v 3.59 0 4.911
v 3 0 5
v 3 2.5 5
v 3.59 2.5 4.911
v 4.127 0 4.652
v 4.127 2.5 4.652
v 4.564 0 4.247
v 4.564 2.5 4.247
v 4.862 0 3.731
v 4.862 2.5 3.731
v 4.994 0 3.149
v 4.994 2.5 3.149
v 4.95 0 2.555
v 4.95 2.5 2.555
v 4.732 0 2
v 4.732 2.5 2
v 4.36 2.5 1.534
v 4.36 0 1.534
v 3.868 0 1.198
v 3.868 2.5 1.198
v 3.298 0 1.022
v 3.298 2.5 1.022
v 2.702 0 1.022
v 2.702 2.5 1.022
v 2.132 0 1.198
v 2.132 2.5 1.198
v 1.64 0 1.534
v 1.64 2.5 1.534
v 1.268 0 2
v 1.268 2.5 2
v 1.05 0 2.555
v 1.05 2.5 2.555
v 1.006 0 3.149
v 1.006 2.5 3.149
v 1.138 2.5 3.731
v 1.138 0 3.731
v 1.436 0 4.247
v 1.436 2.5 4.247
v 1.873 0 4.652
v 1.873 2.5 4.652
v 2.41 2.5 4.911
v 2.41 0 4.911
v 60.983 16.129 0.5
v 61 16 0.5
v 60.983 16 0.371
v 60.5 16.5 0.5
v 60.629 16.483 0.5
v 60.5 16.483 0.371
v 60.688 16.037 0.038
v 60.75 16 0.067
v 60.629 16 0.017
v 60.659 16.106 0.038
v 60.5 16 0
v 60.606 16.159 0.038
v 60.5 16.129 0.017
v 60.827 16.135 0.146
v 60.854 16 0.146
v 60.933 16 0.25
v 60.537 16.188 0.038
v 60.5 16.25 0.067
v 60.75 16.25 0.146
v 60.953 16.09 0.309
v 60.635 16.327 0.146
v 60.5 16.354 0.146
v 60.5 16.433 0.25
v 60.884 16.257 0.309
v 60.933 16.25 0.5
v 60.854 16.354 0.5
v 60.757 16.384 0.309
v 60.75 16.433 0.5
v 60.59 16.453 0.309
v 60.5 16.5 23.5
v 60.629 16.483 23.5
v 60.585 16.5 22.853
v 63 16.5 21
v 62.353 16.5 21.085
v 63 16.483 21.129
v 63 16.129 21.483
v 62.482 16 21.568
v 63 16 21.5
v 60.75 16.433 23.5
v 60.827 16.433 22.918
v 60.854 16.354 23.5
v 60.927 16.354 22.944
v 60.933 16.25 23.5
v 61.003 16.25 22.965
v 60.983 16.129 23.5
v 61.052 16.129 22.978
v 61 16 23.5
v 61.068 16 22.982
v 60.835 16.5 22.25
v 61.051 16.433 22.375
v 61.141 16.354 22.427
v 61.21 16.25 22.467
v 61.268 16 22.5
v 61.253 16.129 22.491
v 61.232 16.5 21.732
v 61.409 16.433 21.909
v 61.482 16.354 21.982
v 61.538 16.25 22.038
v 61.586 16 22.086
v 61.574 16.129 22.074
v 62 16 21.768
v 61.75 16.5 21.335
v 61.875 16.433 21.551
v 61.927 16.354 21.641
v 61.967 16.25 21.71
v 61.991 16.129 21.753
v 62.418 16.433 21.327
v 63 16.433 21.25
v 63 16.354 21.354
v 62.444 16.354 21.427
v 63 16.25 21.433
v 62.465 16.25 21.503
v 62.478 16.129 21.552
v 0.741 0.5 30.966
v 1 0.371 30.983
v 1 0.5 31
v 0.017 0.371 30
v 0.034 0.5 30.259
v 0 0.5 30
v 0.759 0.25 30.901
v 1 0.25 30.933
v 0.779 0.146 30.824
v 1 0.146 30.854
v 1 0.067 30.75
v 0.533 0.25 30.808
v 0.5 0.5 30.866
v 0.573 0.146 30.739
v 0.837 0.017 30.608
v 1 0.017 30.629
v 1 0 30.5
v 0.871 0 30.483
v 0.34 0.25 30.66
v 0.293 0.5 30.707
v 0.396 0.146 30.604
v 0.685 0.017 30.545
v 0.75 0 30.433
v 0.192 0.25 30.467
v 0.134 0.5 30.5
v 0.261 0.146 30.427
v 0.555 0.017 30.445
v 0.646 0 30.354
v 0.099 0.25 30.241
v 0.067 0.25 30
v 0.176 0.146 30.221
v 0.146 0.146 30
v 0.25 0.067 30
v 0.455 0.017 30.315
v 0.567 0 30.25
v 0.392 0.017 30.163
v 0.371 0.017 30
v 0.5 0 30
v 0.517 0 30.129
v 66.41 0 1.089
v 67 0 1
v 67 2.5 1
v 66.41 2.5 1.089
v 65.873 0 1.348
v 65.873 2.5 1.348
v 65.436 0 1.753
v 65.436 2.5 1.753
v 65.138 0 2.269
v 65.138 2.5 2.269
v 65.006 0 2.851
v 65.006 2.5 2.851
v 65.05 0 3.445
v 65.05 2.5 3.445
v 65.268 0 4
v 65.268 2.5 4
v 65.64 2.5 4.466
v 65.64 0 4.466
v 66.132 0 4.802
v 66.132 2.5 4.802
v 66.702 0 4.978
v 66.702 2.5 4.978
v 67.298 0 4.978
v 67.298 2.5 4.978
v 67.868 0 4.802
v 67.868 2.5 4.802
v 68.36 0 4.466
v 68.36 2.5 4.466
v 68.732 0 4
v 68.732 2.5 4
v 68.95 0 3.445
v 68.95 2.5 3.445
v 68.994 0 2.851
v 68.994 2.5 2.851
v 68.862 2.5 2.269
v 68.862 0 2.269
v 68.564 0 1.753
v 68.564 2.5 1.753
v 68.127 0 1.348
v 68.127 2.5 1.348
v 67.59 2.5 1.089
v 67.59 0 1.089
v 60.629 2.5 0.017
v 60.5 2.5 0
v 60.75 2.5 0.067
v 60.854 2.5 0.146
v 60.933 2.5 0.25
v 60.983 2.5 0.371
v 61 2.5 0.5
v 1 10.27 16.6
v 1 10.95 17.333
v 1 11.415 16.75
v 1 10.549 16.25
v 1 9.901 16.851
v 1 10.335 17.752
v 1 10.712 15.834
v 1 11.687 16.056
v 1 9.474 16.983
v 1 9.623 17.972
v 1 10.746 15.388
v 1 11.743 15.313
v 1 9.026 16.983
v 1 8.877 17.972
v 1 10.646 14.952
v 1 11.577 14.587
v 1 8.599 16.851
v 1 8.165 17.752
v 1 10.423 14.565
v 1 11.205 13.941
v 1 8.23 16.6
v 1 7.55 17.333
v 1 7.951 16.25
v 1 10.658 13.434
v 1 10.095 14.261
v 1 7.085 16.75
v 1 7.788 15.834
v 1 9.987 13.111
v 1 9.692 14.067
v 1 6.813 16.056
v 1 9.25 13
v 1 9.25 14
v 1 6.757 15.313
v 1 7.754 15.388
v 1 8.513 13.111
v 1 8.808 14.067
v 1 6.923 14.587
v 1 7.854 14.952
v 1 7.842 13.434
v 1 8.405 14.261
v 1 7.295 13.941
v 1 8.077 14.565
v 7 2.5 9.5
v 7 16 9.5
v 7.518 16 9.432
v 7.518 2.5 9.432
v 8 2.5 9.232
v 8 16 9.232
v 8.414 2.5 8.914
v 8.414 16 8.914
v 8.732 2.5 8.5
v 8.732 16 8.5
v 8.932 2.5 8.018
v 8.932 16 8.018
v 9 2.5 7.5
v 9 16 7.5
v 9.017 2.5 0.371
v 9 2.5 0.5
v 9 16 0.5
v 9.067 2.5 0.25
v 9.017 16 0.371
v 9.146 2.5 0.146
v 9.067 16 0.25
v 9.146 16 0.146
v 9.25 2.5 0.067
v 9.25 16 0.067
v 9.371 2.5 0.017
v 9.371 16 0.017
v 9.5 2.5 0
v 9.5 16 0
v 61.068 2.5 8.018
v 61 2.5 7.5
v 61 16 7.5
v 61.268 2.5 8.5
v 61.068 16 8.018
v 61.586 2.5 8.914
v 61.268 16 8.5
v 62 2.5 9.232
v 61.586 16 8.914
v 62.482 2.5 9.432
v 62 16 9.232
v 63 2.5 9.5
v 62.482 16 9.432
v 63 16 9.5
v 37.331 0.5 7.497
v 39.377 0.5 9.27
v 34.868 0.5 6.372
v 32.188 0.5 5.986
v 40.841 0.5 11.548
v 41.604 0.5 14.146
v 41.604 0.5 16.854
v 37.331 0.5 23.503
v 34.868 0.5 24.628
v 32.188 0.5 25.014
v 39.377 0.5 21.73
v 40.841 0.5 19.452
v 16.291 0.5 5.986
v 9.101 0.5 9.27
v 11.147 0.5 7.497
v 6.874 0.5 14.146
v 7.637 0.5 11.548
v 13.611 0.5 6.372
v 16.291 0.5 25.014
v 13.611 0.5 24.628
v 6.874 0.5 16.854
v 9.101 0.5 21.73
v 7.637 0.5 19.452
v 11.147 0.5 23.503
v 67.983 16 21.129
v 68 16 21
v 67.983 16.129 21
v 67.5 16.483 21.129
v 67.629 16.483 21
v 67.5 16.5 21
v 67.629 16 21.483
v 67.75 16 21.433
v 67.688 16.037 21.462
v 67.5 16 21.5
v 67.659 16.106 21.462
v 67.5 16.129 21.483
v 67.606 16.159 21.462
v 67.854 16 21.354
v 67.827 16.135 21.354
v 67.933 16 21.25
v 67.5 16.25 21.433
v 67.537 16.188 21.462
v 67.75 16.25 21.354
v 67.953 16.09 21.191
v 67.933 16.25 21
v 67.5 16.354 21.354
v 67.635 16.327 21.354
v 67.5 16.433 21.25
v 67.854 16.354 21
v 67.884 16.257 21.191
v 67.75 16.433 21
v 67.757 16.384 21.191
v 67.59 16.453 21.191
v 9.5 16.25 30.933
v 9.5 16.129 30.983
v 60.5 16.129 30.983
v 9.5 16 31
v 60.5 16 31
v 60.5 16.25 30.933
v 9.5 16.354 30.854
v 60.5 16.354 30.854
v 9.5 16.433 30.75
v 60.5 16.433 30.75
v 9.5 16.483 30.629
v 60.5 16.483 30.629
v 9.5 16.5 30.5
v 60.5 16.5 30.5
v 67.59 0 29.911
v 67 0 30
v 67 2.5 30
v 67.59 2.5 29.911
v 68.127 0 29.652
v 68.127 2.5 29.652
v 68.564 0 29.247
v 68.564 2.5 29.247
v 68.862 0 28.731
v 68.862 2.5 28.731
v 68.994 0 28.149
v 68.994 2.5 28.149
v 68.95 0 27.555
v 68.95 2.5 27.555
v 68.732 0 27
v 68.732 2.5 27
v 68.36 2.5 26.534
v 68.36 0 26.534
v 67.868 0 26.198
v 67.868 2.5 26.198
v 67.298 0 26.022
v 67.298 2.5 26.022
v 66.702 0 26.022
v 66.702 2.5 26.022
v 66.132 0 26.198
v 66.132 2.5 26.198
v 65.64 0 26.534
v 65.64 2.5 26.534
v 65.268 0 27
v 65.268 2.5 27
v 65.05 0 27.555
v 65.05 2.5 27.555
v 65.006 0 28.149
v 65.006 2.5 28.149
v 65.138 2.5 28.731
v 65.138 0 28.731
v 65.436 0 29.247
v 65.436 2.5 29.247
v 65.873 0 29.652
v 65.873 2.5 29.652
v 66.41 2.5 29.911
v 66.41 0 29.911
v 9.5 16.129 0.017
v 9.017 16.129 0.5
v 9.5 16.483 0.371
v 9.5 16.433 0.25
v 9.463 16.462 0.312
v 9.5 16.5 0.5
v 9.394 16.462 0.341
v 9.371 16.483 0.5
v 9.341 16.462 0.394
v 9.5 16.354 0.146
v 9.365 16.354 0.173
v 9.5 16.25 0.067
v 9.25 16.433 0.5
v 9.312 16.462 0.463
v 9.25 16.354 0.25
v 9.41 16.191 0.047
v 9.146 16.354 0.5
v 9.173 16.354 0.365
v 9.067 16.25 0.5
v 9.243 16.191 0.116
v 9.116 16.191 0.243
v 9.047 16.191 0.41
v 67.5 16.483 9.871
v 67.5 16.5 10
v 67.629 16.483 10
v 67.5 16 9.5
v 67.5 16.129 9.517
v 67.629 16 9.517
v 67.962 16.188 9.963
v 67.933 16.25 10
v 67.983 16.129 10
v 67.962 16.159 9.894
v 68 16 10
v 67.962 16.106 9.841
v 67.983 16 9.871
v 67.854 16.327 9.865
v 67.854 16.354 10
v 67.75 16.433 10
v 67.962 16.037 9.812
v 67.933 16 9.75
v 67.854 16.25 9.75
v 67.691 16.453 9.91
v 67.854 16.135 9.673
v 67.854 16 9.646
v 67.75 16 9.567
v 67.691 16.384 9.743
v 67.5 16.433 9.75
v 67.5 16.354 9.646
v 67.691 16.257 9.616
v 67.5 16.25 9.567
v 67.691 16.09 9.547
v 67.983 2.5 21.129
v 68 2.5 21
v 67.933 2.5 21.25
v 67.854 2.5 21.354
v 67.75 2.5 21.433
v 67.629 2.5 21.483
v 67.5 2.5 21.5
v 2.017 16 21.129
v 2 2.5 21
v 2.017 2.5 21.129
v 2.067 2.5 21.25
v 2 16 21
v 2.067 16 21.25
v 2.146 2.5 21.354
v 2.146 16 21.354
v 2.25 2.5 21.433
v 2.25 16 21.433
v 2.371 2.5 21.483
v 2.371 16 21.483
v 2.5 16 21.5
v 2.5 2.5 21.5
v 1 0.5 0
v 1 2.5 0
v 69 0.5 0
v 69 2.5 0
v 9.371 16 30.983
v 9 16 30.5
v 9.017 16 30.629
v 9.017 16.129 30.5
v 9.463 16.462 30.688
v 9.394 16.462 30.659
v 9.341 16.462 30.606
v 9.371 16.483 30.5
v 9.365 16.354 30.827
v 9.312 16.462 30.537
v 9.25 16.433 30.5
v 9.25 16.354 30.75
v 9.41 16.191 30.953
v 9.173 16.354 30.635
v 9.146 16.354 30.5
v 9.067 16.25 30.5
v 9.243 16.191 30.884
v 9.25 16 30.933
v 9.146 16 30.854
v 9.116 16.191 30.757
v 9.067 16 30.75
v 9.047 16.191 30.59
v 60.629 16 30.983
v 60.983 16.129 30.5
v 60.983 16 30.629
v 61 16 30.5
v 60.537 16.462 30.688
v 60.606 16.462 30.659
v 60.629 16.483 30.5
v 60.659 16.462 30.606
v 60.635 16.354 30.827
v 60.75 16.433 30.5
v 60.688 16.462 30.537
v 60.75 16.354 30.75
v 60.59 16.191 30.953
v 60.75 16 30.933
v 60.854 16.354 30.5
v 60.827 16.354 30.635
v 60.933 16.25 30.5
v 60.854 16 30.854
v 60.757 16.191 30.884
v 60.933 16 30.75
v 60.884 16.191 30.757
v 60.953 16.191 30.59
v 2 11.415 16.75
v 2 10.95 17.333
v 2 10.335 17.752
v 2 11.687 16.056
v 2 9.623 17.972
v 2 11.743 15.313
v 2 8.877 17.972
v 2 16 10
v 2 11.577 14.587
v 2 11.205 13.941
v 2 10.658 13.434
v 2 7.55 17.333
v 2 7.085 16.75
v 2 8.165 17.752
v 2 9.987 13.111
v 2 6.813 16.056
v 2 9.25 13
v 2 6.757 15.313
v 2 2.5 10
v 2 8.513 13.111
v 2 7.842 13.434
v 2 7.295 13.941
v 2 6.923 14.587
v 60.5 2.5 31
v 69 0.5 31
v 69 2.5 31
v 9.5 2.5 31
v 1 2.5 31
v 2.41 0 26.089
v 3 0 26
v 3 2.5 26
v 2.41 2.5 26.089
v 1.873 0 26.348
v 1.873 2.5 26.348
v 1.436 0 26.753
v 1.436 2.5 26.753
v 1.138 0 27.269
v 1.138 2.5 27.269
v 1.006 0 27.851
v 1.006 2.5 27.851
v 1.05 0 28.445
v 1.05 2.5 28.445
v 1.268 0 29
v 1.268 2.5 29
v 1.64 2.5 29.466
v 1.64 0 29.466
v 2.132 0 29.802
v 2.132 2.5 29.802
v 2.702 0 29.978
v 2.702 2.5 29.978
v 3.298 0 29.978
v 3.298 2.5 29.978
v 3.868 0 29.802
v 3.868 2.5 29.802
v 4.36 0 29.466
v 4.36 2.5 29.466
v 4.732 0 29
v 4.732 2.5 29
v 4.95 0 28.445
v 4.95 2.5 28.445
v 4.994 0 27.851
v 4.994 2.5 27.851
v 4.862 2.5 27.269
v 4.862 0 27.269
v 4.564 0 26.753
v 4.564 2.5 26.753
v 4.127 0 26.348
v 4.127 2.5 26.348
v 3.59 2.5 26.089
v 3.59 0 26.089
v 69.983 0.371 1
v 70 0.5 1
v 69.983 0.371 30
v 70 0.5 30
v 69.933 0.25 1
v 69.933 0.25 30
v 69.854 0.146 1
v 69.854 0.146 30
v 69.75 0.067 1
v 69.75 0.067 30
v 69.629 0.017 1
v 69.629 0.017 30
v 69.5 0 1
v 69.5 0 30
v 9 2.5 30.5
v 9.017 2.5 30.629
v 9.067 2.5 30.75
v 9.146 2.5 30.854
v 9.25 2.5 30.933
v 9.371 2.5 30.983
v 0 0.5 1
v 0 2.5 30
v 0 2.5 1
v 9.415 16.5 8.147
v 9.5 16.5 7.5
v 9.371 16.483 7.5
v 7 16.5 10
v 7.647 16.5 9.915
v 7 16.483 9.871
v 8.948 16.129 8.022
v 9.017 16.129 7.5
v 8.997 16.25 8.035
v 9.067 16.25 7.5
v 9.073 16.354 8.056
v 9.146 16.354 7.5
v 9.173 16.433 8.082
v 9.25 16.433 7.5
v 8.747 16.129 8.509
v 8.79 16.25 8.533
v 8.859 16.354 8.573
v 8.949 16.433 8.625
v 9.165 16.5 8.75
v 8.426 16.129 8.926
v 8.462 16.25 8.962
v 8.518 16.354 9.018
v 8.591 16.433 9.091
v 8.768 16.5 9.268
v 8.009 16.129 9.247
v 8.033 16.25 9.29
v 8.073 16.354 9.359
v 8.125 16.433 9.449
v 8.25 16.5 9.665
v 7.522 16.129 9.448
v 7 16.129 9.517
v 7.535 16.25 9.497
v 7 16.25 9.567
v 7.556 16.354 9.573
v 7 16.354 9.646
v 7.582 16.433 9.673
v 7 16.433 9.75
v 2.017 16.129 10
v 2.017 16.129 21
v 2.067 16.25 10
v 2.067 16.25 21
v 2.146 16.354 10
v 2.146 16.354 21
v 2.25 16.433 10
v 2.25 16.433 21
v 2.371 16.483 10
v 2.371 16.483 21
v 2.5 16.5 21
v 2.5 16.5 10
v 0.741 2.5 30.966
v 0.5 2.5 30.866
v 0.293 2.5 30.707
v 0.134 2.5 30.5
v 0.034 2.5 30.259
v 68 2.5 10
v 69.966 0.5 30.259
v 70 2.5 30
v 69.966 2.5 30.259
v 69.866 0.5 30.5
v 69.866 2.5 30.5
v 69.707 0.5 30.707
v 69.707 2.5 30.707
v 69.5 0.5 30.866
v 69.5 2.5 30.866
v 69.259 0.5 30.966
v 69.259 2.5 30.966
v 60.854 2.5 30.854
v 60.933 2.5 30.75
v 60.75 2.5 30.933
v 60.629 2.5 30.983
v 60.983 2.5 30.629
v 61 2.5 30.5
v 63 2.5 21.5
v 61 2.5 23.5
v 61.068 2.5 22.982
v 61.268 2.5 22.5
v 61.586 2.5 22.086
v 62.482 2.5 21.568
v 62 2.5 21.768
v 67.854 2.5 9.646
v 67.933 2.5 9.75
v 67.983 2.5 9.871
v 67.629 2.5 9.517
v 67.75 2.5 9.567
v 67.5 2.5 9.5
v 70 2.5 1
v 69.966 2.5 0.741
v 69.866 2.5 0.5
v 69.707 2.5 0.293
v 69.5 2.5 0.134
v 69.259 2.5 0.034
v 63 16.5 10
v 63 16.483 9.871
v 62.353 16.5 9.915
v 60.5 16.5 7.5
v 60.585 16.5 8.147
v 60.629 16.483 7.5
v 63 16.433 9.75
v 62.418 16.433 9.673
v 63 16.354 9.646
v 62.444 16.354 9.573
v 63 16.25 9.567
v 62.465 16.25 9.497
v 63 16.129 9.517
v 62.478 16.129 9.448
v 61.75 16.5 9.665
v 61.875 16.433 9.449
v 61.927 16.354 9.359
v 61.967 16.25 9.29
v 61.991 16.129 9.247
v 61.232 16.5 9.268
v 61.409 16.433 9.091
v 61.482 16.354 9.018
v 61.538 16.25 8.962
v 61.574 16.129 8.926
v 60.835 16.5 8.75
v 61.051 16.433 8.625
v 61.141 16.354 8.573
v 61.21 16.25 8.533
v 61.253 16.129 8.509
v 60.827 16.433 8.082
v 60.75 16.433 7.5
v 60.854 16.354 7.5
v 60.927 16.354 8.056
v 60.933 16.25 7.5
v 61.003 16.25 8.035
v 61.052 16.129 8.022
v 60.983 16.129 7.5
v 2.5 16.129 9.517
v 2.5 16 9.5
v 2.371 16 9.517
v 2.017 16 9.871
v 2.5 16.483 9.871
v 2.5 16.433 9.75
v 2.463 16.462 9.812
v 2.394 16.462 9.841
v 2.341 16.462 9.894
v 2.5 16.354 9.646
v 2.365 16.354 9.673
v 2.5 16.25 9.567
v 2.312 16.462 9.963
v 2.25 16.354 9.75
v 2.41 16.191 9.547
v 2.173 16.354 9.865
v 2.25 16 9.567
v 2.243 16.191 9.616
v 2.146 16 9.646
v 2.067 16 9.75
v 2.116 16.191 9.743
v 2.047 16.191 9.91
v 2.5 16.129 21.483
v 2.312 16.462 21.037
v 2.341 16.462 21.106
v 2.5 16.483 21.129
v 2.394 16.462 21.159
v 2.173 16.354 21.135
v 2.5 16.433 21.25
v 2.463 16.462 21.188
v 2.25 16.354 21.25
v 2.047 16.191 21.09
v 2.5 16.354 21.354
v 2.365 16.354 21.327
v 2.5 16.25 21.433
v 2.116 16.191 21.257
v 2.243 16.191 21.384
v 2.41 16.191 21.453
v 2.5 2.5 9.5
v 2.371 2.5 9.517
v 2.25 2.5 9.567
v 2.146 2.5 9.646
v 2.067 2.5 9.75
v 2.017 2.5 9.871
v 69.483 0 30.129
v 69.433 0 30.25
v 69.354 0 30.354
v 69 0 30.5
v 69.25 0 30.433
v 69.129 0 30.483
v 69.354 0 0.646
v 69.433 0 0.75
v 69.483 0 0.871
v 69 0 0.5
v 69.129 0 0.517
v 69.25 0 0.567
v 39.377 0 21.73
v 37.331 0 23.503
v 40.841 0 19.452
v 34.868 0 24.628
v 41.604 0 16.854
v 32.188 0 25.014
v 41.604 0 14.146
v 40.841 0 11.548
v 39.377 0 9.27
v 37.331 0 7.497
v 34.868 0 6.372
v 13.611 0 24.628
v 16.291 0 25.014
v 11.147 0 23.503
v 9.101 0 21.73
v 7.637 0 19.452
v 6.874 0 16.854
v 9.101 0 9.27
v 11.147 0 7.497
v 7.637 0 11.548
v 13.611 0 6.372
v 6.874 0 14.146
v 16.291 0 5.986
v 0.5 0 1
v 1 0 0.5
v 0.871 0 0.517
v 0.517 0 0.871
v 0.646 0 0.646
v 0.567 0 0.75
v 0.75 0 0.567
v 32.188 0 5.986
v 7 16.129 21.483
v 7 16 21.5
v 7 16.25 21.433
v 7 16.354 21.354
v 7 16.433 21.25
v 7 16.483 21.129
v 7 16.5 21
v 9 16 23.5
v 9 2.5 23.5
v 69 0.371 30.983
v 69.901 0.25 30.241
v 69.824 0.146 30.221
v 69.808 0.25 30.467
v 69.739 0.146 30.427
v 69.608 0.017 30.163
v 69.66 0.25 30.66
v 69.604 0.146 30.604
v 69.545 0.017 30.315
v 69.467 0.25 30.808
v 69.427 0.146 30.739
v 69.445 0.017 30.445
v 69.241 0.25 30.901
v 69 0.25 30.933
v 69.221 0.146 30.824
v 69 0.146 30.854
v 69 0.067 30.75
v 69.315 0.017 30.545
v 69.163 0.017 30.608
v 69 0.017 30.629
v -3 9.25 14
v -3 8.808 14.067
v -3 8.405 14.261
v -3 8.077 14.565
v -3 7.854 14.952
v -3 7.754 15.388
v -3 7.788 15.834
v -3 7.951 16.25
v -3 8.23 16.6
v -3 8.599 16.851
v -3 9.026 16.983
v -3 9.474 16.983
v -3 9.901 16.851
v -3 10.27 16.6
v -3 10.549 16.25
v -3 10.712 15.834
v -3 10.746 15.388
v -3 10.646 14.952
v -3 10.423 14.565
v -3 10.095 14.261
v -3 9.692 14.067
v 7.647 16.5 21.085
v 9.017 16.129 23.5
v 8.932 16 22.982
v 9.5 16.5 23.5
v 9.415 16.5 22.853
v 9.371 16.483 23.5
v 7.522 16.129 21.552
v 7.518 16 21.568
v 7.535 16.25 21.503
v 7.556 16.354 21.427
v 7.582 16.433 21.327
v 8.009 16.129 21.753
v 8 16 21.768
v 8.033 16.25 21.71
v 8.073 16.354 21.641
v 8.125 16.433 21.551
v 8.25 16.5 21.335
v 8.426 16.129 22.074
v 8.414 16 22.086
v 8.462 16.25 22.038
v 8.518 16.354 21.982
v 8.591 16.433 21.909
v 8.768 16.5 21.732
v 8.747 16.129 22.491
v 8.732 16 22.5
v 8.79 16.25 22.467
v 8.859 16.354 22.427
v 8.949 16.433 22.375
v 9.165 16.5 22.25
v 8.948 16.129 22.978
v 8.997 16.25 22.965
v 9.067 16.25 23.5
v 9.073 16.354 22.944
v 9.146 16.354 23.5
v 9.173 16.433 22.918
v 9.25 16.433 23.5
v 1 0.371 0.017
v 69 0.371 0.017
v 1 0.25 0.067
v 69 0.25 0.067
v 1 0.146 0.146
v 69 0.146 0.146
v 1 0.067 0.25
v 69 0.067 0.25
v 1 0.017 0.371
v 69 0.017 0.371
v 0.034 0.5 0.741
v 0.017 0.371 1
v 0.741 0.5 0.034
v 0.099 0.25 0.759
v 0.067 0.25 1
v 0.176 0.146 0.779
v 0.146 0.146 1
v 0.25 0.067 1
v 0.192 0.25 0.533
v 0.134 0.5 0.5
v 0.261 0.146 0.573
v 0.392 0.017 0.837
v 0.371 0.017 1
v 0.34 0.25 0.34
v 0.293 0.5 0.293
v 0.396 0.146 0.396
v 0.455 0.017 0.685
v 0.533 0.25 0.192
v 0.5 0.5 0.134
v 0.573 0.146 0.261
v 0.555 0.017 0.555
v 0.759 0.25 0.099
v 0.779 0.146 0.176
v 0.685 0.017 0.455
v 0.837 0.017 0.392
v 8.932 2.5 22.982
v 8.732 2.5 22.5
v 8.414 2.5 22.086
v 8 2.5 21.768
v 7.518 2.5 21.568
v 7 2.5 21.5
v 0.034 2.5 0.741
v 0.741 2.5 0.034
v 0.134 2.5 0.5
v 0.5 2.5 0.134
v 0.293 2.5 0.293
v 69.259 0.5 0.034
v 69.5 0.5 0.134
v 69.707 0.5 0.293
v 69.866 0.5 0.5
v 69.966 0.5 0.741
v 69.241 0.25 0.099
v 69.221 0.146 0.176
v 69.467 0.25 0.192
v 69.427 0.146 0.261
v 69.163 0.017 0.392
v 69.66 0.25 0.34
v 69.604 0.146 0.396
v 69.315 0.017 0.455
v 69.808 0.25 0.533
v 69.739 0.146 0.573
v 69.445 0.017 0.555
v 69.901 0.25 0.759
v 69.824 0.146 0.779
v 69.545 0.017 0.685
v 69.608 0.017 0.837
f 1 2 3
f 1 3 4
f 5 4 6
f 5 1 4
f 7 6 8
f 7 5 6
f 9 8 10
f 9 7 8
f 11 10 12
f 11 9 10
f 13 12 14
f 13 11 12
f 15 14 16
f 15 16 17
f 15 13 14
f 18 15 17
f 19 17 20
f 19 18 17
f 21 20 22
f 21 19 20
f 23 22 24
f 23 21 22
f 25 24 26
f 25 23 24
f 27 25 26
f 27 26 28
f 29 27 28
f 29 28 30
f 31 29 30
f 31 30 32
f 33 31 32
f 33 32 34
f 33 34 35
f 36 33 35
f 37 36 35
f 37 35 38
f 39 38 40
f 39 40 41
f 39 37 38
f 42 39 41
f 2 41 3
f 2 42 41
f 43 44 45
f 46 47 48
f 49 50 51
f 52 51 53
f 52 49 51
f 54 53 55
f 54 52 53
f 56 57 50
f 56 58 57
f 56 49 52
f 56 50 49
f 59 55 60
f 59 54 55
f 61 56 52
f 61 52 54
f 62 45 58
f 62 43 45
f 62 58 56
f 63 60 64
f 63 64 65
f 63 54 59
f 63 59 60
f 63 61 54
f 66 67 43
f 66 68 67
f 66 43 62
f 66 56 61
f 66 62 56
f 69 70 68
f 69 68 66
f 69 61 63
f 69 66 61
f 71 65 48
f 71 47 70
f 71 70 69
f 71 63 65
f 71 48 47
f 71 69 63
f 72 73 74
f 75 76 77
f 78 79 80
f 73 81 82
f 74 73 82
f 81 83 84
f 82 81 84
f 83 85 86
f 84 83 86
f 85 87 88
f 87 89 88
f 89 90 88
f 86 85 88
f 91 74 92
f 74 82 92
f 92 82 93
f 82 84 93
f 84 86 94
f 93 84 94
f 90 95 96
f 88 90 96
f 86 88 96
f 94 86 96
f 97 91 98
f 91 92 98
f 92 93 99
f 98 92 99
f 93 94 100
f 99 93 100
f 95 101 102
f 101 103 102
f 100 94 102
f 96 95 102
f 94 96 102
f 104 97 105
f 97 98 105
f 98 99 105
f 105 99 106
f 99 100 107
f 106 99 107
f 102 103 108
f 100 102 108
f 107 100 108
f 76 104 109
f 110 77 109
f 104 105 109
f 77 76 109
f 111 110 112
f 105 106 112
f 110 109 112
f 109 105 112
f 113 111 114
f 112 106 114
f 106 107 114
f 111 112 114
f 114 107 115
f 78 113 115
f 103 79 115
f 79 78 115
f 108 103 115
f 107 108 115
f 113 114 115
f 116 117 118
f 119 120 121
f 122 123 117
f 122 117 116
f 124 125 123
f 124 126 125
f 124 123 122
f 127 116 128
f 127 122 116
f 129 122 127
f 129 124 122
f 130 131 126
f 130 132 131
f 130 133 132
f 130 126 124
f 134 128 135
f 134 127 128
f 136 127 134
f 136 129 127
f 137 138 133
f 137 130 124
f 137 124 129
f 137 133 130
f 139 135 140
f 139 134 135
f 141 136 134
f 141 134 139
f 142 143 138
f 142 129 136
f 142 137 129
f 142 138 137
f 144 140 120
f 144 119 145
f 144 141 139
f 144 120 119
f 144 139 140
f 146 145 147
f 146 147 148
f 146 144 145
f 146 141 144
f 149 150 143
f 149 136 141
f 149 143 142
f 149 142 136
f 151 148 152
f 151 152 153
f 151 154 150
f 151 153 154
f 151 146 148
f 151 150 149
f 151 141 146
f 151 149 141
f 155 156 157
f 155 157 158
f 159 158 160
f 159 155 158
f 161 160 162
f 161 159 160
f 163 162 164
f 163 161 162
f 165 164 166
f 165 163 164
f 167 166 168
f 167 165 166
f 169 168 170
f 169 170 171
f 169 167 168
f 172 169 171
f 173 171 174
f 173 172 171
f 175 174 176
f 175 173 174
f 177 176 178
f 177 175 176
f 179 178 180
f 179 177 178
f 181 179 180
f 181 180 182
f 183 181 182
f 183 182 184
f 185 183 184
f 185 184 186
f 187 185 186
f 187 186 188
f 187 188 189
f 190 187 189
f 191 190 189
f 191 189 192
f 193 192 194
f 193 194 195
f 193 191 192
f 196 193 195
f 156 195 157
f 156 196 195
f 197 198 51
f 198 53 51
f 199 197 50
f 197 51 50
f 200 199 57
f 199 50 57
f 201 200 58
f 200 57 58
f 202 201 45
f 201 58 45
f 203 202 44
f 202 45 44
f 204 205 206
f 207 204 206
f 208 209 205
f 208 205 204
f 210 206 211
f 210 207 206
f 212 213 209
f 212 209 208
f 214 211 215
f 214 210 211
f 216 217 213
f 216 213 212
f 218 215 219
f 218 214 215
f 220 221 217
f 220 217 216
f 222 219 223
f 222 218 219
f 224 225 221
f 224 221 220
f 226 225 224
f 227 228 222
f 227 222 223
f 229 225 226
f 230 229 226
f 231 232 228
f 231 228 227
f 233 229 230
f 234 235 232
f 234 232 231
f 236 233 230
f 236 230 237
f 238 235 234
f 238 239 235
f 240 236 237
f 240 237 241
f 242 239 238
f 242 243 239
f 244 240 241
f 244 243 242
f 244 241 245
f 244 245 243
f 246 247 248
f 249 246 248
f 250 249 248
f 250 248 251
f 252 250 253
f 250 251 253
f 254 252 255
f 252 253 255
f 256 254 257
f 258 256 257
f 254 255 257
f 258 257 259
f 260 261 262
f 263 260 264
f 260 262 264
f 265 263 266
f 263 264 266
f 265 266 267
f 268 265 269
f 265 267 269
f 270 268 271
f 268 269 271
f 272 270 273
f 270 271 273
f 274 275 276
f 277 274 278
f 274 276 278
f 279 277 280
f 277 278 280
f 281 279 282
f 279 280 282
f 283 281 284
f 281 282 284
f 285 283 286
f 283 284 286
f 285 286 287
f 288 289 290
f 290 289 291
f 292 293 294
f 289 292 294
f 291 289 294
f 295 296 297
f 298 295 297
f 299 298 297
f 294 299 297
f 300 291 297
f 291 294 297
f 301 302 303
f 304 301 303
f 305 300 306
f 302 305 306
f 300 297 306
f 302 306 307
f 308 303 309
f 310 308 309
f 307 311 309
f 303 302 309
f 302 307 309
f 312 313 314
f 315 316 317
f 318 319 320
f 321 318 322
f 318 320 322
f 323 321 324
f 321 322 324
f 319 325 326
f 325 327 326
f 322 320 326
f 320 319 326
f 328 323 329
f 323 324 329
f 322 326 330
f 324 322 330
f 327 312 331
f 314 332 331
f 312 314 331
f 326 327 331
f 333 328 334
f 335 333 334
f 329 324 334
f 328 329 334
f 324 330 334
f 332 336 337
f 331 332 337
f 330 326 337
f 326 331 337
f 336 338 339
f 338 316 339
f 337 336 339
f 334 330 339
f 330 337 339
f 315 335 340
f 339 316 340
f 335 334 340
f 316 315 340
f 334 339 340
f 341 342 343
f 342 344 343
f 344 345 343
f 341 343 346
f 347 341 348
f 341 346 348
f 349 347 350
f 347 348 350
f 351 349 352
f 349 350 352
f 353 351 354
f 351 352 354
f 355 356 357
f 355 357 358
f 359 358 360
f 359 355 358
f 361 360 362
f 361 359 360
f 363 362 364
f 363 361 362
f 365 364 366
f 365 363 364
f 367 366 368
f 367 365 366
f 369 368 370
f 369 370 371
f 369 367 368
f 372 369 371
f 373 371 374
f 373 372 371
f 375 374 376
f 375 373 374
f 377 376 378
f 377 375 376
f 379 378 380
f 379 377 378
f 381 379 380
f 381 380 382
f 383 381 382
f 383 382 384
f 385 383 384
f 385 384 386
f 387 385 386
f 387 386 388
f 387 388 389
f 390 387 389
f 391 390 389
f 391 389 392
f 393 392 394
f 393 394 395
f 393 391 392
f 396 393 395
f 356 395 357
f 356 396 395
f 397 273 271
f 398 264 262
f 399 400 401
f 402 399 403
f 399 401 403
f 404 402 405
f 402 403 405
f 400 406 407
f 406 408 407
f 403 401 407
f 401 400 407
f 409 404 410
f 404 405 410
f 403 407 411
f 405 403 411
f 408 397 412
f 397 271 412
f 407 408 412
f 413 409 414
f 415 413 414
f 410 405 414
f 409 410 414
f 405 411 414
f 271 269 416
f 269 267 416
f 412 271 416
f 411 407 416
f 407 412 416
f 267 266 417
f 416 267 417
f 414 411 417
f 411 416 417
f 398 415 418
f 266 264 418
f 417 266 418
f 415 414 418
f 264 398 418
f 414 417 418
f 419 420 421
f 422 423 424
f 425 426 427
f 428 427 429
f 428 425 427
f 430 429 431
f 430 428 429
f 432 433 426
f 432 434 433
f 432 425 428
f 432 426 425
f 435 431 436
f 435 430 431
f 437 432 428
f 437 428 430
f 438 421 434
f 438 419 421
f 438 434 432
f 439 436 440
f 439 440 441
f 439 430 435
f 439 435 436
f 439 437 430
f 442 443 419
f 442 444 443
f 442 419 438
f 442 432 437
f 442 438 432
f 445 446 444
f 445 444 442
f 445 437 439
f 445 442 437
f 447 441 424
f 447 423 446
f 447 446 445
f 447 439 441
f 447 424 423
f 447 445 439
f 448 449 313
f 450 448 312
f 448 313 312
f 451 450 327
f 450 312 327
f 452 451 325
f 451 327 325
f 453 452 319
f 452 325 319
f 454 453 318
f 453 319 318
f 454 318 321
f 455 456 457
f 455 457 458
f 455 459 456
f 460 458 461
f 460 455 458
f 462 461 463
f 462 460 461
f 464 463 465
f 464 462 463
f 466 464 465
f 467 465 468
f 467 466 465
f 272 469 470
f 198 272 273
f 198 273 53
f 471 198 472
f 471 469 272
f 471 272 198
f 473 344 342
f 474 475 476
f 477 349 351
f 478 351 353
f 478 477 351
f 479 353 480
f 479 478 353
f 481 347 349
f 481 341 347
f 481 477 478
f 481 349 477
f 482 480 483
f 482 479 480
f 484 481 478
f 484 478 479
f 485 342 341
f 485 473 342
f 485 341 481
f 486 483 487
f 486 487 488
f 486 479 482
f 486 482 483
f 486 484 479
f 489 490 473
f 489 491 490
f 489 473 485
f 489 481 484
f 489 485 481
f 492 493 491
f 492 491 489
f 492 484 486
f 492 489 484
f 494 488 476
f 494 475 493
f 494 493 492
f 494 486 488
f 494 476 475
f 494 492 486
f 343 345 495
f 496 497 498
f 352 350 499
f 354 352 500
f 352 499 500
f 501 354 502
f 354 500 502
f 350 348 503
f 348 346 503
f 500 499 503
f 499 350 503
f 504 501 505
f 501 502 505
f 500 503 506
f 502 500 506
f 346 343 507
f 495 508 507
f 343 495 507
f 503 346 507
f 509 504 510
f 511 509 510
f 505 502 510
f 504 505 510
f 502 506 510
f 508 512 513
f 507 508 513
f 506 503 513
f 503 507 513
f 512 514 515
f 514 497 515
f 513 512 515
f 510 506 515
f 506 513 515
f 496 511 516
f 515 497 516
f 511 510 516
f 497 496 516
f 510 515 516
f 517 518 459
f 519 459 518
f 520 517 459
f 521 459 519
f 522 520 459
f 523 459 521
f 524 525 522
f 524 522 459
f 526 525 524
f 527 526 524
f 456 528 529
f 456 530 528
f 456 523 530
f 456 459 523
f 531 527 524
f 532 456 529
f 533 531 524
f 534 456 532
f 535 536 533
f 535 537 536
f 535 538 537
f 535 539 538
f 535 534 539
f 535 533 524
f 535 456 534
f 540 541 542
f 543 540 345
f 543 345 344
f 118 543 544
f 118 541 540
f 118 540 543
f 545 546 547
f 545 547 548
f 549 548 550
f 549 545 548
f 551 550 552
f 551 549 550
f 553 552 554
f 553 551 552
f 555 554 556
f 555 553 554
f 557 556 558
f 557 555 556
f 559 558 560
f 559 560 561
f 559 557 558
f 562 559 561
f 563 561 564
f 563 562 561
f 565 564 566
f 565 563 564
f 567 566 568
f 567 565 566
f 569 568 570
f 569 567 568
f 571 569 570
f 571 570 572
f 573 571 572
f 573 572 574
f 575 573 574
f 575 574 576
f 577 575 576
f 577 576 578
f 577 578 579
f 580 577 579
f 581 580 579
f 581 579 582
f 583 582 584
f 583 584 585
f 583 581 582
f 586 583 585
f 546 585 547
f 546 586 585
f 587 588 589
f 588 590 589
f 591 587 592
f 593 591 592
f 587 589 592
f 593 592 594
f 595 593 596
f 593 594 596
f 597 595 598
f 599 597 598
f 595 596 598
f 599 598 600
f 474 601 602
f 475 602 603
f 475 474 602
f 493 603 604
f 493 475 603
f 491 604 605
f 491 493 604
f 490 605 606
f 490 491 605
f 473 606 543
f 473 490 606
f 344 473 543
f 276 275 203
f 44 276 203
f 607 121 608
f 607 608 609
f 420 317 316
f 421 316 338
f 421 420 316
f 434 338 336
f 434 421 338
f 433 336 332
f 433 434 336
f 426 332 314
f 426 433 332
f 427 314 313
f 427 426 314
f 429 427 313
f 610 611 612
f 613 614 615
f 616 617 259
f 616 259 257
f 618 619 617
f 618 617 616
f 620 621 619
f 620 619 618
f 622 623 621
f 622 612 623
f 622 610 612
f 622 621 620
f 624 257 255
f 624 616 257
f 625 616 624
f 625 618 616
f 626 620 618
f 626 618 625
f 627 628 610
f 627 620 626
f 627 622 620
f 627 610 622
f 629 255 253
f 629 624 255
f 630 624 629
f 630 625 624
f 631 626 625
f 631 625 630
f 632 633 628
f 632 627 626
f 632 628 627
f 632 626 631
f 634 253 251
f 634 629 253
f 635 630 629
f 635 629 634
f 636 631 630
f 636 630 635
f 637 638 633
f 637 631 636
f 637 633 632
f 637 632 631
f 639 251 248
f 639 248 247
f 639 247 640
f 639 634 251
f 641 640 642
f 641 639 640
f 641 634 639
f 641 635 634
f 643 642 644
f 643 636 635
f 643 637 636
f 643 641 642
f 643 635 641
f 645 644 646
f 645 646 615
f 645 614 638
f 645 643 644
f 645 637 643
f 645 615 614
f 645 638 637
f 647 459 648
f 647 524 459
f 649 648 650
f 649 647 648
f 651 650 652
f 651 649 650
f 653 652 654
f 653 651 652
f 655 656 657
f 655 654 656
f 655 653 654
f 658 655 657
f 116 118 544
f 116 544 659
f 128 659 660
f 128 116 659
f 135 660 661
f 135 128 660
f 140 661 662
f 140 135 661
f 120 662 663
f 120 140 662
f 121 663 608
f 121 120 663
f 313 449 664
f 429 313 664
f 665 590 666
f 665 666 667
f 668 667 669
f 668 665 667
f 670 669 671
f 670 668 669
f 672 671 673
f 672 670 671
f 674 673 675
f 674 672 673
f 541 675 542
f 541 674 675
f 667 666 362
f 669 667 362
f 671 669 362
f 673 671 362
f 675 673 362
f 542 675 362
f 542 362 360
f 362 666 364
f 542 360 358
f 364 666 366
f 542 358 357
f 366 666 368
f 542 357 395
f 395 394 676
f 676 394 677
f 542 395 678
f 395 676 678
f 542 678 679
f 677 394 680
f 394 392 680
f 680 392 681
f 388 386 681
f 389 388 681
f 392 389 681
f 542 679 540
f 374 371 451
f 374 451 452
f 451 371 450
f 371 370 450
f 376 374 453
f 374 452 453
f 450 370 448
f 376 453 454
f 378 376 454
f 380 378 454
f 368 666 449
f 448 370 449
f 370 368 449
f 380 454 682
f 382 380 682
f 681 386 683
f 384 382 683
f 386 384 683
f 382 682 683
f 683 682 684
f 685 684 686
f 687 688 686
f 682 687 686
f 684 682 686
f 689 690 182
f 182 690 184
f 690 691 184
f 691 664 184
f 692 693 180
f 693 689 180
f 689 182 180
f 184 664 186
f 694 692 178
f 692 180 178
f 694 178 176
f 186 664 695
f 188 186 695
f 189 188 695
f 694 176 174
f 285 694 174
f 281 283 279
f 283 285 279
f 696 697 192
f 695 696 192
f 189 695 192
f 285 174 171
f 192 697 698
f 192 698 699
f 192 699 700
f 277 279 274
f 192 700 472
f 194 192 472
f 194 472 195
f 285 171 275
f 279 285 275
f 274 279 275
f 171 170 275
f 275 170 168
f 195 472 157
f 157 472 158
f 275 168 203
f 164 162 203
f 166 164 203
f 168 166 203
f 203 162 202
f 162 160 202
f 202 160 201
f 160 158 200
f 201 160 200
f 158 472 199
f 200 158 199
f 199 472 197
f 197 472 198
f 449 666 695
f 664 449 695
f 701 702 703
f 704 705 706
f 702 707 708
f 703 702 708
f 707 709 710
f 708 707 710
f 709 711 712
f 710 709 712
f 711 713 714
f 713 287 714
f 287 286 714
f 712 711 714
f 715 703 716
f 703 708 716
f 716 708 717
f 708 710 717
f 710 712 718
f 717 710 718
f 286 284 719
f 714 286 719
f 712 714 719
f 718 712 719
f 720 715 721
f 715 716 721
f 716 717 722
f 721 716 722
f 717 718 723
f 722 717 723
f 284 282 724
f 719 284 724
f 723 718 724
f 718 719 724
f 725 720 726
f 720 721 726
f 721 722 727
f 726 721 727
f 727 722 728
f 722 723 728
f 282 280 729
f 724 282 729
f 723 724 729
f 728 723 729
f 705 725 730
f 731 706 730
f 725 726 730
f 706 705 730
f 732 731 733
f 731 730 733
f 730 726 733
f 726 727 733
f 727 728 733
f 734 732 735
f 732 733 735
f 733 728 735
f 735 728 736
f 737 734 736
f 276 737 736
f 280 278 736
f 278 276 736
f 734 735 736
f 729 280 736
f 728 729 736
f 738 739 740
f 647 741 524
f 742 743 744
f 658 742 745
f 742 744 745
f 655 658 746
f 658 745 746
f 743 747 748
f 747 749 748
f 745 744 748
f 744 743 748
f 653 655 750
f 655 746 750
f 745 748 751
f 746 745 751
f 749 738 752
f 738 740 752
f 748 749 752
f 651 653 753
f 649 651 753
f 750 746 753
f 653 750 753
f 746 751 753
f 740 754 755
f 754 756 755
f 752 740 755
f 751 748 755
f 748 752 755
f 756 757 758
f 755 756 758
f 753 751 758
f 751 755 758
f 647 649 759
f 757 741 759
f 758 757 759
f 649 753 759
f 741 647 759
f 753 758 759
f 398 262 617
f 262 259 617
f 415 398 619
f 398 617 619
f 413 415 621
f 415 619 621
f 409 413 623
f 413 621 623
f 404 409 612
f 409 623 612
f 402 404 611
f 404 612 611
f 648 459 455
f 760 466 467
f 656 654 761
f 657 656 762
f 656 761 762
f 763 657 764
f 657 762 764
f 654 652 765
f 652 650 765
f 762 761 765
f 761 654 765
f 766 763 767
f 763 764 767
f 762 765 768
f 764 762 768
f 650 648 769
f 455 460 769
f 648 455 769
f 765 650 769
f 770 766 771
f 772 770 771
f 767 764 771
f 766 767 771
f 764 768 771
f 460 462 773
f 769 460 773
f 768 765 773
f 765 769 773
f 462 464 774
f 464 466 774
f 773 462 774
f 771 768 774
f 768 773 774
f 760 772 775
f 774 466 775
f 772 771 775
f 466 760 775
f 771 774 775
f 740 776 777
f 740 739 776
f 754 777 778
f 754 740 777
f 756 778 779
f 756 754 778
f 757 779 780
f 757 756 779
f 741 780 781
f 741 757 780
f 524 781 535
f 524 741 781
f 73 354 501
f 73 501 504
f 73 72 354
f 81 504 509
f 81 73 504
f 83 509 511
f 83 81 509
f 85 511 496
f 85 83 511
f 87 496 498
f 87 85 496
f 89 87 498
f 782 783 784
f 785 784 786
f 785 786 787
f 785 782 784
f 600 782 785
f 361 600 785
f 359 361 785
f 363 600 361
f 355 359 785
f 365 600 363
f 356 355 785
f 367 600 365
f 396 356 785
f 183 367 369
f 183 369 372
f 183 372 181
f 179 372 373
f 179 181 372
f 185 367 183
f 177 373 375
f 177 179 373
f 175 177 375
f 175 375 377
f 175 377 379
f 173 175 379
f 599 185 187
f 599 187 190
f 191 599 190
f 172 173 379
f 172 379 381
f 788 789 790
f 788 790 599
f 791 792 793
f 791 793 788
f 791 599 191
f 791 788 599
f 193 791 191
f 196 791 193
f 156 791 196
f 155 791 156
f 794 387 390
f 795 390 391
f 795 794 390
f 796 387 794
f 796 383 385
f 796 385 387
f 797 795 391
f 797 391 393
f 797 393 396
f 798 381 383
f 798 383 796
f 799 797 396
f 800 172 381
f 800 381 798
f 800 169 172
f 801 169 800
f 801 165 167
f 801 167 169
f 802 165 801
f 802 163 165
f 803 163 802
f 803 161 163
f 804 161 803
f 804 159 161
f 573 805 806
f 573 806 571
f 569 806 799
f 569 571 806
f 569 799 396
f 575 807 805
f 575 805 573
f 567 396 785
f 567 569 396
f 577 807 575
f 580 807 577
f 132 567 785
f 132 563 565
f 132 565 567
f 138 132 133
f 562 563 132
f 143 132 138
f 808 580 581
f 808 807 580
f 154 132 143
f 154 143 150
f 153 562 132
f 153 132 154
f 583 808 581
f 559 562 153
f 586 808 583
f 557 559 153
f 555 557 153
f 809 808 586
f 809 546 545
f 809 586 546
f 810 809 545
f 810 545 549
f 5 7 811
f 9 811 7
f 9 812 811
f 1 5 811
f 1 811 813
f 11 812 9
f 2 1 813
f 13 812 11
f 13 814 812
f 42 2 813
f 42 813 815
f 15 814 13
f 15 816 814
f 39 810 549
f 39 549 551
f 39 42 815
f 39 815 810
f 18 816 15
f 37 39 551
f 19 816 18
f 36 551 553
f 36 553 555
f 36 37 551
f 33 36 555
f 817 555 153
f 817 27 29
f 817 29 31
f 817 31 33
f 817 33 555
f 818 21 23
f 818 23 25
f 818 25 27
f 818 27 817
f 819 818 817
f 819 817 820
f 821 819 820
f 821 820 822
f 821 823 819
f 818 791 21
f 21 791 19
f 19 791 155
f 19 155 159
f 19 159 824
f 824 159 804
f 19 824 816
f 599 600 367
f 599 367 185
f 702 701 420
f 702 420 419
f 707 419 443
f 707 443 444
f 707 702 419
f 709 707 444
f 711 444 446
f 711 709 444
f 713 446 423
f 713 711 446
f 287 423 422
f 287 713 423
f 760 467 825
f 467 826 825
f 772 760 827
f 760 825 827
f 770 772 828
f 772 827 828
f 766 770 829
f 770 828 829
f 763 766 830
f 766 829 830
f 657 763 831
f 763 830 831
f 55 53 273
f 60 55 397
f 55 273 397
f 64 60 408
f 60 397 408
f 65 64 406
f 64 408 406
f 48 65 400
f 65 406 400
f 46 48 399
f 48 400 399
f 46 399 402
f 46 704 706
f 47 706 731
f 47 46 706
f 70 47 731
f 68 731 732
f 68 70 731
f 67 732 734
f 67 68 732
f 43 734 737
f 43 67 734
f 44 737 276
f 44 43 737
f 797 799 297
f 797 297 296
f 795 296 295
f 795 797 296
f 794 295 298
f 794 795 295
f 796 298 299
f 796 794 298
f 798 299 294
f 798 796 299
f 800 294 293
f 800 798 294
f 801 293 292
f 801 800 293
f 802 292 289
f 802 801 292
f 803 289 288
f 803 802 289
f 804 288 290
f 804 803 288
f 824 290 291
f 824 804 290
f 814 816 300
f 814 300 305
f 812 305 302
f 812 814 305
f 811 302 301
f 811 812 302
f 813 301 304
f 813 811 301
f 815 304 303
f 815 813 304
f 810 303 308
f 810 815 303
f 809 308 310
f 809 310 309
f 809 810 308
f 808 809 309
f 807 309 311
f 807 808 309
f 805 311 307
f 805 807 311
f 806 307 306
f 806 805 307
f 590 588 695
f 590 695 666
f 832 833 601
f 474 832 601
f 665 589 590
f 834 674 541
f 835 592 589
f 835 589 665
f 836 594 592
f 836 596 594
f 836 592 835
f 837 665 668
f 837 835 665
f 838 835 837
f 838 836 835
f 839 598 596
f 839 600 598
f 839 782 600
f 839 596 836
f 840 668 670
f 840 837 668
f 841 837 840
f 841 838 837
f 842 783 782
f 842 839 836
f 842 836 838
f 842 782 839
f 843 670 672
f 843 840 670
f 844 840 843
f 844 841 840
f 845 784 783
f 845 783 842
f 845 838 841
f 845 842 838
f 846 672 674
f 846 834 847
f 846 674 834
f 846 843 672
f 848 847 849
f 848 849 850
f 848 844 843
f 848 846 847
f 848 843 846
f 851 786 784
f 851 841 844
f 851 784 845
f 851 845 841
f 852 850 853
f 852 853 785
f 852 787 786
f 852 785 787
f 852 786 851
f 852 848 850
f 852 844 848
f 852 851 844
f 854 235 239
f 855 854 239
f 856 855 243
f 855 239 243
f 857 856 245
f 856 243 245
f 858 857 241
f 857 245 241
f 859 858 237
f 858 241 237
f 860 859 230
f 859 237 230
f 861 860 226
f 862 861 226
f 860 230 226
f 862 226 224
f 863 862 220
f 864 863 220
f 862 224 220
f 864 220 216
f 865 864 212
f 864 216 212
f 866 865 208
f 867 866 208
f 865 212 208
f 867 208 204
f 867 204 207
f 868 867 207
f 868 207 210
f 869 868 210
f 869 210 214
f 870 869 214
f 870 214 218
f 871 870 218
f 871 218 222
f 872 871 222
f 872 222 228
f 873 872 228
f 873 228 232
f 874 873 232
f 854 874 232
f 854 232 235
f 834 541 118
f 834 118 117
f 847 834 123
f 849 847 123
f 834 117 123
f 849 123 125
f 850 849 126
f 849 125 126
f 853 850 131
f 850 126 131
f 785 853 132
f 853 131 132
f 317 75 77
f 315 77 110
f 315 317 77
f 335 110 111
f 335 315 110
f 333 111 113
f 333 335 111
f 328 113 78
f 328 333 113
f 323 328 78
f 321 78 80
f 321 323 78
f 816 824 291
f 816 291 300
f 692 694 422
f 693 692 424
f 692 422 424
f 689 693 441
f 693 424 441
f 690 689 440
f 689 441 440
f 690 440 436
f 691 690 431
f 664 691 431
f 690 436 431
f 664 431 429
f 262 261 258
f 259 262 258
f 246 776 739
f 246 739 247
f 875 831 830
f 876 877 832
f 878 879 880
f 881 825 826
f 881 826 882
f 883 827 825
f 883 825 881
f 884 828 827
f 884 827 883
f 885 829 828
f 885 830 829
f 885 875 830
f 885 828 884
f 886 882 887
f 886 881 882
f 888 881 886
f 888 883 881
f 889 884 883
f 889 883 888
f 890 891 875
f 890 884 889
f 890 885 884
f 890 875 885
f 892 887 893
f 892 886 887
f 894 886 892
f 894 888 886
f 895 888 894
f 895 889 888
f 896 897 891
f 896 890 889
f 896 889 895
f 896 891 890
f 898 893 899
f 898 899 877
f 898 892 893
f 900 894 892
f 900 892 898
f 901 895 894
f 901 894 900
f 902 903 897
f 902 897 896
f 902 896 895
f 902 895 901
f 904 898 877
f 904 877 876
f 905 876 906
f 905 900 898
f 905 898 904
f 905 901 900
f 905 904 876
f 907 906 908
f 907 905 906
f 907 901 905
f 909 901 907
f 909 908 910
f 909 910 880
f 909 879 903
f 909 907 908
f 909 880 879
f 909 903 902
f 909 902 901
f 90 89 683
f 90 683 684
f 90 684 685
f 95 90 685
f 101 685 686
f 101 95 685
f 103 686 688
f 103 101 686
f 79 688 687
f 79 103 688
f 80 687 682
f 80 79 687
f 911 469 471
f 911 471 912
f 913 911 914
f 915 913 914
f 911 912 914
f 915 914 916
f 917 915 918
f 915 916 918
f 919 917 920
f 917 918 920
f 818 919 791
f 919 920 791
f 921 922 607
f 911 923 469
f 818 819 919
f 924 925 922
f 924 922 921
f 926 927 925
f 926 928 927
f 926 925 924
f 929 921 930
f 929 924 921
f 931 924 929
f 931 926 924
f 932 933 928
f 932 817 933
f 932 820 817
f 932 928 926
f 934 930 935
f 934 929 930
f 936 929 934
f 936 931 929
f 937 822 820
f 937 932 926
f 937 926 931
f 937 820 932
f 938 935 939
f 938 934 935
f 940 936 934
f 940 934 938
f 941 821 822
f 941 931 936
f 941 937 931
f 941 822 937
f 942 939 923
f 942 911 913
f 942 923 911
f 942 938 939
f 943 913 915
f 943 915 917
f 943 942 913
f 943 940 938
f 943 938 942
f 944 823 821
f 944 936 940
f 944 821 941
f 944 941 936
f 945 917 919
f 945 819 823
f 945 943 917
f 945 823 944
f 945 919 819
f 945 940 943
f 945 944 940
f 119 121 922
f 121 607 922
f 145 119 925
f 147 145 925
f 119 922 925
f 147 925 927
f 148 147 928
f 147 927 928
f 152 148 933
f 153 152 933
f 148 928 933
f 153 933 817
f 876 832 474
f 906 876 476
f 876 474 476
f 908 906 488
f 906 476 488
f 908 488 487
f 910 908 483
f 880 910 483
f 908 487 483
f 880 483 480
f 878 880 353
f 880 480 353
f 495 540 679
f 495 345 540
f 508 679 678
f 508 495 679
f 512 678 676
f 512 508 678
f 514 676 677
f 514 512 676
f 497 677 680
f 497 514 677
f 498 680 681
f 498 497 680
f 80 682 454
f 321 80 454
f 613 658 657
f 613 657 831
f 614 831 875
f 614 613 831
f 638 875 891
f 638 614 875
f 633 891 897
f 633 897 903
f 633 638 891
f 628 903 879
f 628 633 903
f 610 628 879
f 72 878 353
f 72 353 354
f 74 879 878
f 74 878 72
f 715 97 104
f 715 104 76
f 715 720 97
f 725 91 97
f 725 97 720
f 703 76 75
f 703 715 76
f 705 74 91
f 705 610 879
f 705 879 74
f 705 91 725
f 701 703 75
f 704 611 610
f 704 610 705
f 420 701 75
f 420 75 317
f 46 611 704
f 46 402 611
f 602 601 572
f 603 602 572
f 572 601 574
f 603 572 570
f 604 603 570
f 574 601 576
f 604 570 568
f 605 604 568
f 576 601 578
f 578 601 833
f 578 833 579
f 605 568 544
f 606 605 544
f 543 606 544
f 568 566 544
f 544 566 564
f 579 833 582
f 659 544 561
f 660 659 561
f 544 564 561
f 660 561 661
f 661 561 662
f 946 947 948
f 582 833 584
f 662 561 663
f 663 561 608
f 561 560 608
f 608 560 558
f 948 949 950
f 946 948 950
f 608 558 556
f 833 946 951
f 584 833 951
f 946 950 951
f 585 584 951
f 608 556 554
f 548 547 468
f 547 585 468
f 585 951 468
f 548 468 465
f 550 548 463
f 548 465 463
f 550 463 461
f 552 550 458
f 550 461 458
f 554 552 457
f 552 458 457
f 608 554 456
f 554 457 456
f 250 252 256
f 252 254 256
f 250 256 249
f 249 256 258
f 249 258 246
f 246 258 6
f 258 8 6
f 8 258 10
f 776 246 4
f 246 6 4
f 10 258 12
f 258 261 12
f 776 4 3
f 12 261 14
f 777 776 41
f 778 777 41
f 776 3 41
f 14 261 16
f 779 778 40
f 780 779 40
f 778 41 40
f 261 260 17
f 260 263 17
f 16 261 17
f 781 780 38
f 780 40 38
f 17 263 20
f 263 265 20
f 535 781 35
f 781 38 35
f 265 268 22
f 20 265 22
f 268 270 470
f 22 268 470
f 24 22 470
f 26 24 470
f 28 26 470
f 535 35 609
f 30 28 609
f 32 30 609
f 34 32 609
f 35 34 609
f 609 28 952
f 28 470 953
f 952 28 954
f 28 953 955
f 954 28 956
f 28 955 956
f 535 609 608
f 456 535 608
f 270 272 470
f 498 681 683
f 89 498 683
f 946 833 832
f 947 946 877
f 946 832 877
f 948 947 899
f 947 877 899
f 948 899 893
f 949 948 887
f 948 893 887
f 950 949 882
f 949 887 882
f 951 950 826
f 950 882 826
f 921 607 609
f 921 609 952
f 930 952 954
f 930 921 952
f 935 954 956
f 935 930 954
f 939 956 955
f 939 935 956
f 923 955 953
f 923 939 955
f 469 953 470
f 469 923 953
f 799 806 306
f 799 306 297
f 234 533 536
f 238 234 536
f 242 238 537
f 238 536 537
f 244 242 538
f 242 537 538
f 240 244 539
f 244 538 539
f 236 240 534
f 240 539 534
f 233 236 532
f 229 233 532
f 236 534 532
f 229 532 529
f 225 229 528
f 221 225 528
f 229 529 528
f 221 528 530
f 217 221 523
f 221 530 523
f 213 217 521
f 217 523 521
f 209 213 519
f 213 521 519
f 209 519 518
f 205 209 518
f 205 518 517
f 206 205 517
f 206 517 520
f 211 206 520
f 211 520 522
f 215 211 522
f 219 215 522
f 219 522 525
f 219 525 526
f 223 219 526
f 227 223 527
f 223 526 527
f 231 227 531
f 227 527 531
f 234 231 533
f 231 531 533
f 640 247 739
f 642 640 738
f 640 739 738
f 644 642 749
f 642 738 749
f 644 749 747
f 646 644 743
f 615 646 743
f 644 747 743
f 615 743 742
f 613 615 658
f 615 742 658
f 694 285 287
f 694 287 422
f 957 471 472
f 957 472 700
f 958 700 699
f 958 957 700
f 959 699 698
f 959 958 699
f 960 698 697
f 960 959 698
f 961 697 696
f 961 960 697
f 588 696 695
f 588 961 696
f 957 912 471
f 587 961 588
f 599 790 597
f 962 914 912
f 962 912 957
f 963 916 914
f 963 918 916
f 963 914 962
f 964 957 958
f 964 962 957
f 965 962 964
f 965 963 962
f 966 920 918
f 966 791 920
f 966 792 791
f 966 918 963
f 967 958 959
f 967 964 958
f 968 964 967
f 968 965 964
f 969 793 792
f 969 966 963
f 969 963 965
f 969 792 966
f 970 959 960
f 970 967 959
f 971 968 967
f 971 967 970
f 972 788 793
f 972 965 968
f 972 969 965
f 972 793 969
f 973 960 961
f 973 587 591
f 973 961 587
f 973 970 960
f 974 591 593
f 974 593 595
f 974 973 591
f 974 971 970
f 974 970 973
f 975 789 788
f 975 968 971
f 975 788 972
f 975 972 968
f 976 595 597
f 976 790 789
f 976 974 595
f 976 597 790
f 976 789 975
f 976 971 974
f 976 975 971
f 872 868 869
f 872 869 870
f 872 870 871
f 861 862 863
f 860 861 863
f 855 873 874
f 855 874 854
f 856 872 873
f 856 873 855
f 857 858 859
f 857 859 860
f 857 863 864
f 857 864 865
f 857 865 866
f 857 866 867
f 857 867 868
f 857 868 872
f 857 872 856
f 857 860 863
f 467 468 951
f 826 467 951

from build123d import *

# Parameters (mm, degrees)
SKETCH_1_R          = 2
EXTRUDE_1_DEPTH     = 2.5
SKETCH_2_W          = 7
SKETCH_2_H          = 12
EXTRUDE_2_DEPTH     = 14
FILLET_1_R          = 2
FILLET_2_R          = 2
FILLET_3_R          = 0.5
CUT_EXTRUDE_1_DEPTH = 0.5
SKETCH_4_R          = 1.5
EXTRUDE_3_DEPTH     = 5
SKETCH_5_R          = 2.5
EXTRUDE_4_DEPTH     = 1


with BuildPart() as part:
    # 草图1 → 凸台-拉伸1 (new body)
    with BuildSketch(Plane(origin=(0, 0, 0), x_dir=(1, 0, 0), z_dir=(0, 1, 0))):
        with BuildLine():
            Line((1, 0), (69, 0))
            ThreePointArc((69, 0), (69.707106781, -0.292893219), (70, -1))
            Line((70, -1), (70, -30))
            ThreePointArc((70, -30), (69.707106781, -30.707106781), (69, -31))
            Line((69, -31), (1, -31))
            ThreePointArc((1, -31), (0.292893219, -30.707106781), (0, -30))
            Line((0, -30), (0, -1))
            ThreePointArc((0, -1), (0.292893219, -0.292893219), (1, 0))
        make_face()
        with Locations(Location((3, -3, 0), (0, 0, 270))):
            Circle(SKETCH_1_R, mode=Mode.SUBTRACT)
        with Locations(Location((67, -3, 0), (0, 0, 90))):
            Circle(SKETCH_1_R, mode=Mode.SUBTRACT)
        with Locations(Location((67, -28, 0), (0, 0, 270))):
            Circle(SKETCH_1_R, mode=Mode.SUBTRACT)
        with Locations(Location((3, -28, 0), (0, 0, 90))):
            Circle(SKETCH_1_R, mode=Mode.SUBTRACT)
    extrude(amount=EXTRUDE_1_DEPTH)

    # 草图2 → 凸台-拉伸2 (add)
    with BuildSketch(Plane(origin=(0, 2.5, 0), x_dir=(1, 0, 0), z_dir=(0, 1, 0))):
        Polygon((61, 0), (9, 0), (9, -9.5), (9, -21.5), (9, -31), (61, -31), (61, -21.5), (61, -9.5), align=None)
        with Locations((5.5, -15.5)):
            Rectangle(SKETCH_2_W, SKETCH_2_H)
        with Locations((64.5, -15.5)):
            Rectangle(SKETCH_2_W, SKETCH_2_H)
    extrude(amount=EXTRUDE_2_DEPTH)

    # 圆角1
    fillet_1_edges = [part.edges().sort_by_distance(p)[0] for p in [
        (9, 9.5, 21.5),
    ]]
    fillet(fillet_1_edges, radius=FILLET_1_R)

    # 圆角2
    fillet_2_edges = [part.edges().sort_by_distance(p)[0] for p in [
        (61, 9.5, 9.5),
        (9, 9.5, 9.5),
        (61, 9.5, 21.5),
    ]]
    fillet(fillet_2_edges, radius=FILLET_2_R)

    # 圆角3
    fillet_3_edges = [part.edges().sort_by_distance(p)[0] for p in [
        (0, 0, 15.5),
        (0.292893219, 0, 0.292893219),
        (35, 0, 0),
        (69.707106781, 0, 0.292893219),
        (61, 16.5, 3.75),
        (61, 9.5, 0),
        (9, 9.5, 0),
        (2, 9.5, 9.5),
        (2, 9.5, 21.5),
        (9, 9.5, 31),
        (61, 9.5, 31),
        (68, 16.5, 15.5),
        (68, 9.5, 21.5),
        (68, 9.5, 9.5),
        (35, 16.5, 0),
        (9, 16.5, 3.75),
        (2, 16.5, 15.5),
        (35, 16.5, 31),
        (9, 16.5, 27.25),
        (4.5, 16.5, 21.5),
        (8.414213562, 16.5, 22.085786438),
        (70, 0, 15.5),
        (65.5, 16.5, 21.5),
        (69.707106781, 0, 30.707106781),
        (61, 16.5, 27.25),
        (65.5, 16.5, 9.5),
        (35, 0, 31),
        (4.5, 16.5, 9.5),
        (61.585786438, 16.5, 22.085786438),
        (0.292893219, 0, 30.707106781),
        (61.585786438, 16.5, 8.914213562),
        (8.414213562, 16.5, 8.914213562),
    ]]
    fillet(fillet_3_edges, radius=FILLET_3_R)

    # 草图3 → 切除-拉伸1 (cut)
    with BuildSketch(Plane.XZ):
        with BuildLine():
            Line((16.290844115, 25.013544626), (32.187512514, 25.013544626))
            ThreePointArc((32.187512514, 25.013544626), (41.70105714, 15.5), (32.187512514, 5.986455374))
            Line((32.187512514, 5.986455374), (16.290844115, 5.986455374))
            ThreePointArc((16.290844115, 5.986455374), (6.777299489, 15.5), (16.290844115, 25.013544626))
        make_face()
    extrude(amount=-CUT_EXTRUDE_1_DEPTH, mode=Mode.SUBTRACT)

    # 草图4 → 凸台-拉伸3 (add)
    with BuildSketch(Plane.ZY.offset(-2)):
        with Locations(Location((15.5, 9.25, 0), (0, 0, 180))):
            Circle(SKETCH_4_R)
    extrude(amount=EXTRUDE_3_DEPTH)

    # 草图5 → 凸台-拉伸4 (add)
    with BuildSketch(Plane.ZY.offset(-2)):
        with Locations(Location((15.5, 9.25, 0), (0, 0, 180))):
            Circle(SKETCH_5_R)
    extrude(amount=EXTRUDE_4_DEPTH)


solid = part.part
